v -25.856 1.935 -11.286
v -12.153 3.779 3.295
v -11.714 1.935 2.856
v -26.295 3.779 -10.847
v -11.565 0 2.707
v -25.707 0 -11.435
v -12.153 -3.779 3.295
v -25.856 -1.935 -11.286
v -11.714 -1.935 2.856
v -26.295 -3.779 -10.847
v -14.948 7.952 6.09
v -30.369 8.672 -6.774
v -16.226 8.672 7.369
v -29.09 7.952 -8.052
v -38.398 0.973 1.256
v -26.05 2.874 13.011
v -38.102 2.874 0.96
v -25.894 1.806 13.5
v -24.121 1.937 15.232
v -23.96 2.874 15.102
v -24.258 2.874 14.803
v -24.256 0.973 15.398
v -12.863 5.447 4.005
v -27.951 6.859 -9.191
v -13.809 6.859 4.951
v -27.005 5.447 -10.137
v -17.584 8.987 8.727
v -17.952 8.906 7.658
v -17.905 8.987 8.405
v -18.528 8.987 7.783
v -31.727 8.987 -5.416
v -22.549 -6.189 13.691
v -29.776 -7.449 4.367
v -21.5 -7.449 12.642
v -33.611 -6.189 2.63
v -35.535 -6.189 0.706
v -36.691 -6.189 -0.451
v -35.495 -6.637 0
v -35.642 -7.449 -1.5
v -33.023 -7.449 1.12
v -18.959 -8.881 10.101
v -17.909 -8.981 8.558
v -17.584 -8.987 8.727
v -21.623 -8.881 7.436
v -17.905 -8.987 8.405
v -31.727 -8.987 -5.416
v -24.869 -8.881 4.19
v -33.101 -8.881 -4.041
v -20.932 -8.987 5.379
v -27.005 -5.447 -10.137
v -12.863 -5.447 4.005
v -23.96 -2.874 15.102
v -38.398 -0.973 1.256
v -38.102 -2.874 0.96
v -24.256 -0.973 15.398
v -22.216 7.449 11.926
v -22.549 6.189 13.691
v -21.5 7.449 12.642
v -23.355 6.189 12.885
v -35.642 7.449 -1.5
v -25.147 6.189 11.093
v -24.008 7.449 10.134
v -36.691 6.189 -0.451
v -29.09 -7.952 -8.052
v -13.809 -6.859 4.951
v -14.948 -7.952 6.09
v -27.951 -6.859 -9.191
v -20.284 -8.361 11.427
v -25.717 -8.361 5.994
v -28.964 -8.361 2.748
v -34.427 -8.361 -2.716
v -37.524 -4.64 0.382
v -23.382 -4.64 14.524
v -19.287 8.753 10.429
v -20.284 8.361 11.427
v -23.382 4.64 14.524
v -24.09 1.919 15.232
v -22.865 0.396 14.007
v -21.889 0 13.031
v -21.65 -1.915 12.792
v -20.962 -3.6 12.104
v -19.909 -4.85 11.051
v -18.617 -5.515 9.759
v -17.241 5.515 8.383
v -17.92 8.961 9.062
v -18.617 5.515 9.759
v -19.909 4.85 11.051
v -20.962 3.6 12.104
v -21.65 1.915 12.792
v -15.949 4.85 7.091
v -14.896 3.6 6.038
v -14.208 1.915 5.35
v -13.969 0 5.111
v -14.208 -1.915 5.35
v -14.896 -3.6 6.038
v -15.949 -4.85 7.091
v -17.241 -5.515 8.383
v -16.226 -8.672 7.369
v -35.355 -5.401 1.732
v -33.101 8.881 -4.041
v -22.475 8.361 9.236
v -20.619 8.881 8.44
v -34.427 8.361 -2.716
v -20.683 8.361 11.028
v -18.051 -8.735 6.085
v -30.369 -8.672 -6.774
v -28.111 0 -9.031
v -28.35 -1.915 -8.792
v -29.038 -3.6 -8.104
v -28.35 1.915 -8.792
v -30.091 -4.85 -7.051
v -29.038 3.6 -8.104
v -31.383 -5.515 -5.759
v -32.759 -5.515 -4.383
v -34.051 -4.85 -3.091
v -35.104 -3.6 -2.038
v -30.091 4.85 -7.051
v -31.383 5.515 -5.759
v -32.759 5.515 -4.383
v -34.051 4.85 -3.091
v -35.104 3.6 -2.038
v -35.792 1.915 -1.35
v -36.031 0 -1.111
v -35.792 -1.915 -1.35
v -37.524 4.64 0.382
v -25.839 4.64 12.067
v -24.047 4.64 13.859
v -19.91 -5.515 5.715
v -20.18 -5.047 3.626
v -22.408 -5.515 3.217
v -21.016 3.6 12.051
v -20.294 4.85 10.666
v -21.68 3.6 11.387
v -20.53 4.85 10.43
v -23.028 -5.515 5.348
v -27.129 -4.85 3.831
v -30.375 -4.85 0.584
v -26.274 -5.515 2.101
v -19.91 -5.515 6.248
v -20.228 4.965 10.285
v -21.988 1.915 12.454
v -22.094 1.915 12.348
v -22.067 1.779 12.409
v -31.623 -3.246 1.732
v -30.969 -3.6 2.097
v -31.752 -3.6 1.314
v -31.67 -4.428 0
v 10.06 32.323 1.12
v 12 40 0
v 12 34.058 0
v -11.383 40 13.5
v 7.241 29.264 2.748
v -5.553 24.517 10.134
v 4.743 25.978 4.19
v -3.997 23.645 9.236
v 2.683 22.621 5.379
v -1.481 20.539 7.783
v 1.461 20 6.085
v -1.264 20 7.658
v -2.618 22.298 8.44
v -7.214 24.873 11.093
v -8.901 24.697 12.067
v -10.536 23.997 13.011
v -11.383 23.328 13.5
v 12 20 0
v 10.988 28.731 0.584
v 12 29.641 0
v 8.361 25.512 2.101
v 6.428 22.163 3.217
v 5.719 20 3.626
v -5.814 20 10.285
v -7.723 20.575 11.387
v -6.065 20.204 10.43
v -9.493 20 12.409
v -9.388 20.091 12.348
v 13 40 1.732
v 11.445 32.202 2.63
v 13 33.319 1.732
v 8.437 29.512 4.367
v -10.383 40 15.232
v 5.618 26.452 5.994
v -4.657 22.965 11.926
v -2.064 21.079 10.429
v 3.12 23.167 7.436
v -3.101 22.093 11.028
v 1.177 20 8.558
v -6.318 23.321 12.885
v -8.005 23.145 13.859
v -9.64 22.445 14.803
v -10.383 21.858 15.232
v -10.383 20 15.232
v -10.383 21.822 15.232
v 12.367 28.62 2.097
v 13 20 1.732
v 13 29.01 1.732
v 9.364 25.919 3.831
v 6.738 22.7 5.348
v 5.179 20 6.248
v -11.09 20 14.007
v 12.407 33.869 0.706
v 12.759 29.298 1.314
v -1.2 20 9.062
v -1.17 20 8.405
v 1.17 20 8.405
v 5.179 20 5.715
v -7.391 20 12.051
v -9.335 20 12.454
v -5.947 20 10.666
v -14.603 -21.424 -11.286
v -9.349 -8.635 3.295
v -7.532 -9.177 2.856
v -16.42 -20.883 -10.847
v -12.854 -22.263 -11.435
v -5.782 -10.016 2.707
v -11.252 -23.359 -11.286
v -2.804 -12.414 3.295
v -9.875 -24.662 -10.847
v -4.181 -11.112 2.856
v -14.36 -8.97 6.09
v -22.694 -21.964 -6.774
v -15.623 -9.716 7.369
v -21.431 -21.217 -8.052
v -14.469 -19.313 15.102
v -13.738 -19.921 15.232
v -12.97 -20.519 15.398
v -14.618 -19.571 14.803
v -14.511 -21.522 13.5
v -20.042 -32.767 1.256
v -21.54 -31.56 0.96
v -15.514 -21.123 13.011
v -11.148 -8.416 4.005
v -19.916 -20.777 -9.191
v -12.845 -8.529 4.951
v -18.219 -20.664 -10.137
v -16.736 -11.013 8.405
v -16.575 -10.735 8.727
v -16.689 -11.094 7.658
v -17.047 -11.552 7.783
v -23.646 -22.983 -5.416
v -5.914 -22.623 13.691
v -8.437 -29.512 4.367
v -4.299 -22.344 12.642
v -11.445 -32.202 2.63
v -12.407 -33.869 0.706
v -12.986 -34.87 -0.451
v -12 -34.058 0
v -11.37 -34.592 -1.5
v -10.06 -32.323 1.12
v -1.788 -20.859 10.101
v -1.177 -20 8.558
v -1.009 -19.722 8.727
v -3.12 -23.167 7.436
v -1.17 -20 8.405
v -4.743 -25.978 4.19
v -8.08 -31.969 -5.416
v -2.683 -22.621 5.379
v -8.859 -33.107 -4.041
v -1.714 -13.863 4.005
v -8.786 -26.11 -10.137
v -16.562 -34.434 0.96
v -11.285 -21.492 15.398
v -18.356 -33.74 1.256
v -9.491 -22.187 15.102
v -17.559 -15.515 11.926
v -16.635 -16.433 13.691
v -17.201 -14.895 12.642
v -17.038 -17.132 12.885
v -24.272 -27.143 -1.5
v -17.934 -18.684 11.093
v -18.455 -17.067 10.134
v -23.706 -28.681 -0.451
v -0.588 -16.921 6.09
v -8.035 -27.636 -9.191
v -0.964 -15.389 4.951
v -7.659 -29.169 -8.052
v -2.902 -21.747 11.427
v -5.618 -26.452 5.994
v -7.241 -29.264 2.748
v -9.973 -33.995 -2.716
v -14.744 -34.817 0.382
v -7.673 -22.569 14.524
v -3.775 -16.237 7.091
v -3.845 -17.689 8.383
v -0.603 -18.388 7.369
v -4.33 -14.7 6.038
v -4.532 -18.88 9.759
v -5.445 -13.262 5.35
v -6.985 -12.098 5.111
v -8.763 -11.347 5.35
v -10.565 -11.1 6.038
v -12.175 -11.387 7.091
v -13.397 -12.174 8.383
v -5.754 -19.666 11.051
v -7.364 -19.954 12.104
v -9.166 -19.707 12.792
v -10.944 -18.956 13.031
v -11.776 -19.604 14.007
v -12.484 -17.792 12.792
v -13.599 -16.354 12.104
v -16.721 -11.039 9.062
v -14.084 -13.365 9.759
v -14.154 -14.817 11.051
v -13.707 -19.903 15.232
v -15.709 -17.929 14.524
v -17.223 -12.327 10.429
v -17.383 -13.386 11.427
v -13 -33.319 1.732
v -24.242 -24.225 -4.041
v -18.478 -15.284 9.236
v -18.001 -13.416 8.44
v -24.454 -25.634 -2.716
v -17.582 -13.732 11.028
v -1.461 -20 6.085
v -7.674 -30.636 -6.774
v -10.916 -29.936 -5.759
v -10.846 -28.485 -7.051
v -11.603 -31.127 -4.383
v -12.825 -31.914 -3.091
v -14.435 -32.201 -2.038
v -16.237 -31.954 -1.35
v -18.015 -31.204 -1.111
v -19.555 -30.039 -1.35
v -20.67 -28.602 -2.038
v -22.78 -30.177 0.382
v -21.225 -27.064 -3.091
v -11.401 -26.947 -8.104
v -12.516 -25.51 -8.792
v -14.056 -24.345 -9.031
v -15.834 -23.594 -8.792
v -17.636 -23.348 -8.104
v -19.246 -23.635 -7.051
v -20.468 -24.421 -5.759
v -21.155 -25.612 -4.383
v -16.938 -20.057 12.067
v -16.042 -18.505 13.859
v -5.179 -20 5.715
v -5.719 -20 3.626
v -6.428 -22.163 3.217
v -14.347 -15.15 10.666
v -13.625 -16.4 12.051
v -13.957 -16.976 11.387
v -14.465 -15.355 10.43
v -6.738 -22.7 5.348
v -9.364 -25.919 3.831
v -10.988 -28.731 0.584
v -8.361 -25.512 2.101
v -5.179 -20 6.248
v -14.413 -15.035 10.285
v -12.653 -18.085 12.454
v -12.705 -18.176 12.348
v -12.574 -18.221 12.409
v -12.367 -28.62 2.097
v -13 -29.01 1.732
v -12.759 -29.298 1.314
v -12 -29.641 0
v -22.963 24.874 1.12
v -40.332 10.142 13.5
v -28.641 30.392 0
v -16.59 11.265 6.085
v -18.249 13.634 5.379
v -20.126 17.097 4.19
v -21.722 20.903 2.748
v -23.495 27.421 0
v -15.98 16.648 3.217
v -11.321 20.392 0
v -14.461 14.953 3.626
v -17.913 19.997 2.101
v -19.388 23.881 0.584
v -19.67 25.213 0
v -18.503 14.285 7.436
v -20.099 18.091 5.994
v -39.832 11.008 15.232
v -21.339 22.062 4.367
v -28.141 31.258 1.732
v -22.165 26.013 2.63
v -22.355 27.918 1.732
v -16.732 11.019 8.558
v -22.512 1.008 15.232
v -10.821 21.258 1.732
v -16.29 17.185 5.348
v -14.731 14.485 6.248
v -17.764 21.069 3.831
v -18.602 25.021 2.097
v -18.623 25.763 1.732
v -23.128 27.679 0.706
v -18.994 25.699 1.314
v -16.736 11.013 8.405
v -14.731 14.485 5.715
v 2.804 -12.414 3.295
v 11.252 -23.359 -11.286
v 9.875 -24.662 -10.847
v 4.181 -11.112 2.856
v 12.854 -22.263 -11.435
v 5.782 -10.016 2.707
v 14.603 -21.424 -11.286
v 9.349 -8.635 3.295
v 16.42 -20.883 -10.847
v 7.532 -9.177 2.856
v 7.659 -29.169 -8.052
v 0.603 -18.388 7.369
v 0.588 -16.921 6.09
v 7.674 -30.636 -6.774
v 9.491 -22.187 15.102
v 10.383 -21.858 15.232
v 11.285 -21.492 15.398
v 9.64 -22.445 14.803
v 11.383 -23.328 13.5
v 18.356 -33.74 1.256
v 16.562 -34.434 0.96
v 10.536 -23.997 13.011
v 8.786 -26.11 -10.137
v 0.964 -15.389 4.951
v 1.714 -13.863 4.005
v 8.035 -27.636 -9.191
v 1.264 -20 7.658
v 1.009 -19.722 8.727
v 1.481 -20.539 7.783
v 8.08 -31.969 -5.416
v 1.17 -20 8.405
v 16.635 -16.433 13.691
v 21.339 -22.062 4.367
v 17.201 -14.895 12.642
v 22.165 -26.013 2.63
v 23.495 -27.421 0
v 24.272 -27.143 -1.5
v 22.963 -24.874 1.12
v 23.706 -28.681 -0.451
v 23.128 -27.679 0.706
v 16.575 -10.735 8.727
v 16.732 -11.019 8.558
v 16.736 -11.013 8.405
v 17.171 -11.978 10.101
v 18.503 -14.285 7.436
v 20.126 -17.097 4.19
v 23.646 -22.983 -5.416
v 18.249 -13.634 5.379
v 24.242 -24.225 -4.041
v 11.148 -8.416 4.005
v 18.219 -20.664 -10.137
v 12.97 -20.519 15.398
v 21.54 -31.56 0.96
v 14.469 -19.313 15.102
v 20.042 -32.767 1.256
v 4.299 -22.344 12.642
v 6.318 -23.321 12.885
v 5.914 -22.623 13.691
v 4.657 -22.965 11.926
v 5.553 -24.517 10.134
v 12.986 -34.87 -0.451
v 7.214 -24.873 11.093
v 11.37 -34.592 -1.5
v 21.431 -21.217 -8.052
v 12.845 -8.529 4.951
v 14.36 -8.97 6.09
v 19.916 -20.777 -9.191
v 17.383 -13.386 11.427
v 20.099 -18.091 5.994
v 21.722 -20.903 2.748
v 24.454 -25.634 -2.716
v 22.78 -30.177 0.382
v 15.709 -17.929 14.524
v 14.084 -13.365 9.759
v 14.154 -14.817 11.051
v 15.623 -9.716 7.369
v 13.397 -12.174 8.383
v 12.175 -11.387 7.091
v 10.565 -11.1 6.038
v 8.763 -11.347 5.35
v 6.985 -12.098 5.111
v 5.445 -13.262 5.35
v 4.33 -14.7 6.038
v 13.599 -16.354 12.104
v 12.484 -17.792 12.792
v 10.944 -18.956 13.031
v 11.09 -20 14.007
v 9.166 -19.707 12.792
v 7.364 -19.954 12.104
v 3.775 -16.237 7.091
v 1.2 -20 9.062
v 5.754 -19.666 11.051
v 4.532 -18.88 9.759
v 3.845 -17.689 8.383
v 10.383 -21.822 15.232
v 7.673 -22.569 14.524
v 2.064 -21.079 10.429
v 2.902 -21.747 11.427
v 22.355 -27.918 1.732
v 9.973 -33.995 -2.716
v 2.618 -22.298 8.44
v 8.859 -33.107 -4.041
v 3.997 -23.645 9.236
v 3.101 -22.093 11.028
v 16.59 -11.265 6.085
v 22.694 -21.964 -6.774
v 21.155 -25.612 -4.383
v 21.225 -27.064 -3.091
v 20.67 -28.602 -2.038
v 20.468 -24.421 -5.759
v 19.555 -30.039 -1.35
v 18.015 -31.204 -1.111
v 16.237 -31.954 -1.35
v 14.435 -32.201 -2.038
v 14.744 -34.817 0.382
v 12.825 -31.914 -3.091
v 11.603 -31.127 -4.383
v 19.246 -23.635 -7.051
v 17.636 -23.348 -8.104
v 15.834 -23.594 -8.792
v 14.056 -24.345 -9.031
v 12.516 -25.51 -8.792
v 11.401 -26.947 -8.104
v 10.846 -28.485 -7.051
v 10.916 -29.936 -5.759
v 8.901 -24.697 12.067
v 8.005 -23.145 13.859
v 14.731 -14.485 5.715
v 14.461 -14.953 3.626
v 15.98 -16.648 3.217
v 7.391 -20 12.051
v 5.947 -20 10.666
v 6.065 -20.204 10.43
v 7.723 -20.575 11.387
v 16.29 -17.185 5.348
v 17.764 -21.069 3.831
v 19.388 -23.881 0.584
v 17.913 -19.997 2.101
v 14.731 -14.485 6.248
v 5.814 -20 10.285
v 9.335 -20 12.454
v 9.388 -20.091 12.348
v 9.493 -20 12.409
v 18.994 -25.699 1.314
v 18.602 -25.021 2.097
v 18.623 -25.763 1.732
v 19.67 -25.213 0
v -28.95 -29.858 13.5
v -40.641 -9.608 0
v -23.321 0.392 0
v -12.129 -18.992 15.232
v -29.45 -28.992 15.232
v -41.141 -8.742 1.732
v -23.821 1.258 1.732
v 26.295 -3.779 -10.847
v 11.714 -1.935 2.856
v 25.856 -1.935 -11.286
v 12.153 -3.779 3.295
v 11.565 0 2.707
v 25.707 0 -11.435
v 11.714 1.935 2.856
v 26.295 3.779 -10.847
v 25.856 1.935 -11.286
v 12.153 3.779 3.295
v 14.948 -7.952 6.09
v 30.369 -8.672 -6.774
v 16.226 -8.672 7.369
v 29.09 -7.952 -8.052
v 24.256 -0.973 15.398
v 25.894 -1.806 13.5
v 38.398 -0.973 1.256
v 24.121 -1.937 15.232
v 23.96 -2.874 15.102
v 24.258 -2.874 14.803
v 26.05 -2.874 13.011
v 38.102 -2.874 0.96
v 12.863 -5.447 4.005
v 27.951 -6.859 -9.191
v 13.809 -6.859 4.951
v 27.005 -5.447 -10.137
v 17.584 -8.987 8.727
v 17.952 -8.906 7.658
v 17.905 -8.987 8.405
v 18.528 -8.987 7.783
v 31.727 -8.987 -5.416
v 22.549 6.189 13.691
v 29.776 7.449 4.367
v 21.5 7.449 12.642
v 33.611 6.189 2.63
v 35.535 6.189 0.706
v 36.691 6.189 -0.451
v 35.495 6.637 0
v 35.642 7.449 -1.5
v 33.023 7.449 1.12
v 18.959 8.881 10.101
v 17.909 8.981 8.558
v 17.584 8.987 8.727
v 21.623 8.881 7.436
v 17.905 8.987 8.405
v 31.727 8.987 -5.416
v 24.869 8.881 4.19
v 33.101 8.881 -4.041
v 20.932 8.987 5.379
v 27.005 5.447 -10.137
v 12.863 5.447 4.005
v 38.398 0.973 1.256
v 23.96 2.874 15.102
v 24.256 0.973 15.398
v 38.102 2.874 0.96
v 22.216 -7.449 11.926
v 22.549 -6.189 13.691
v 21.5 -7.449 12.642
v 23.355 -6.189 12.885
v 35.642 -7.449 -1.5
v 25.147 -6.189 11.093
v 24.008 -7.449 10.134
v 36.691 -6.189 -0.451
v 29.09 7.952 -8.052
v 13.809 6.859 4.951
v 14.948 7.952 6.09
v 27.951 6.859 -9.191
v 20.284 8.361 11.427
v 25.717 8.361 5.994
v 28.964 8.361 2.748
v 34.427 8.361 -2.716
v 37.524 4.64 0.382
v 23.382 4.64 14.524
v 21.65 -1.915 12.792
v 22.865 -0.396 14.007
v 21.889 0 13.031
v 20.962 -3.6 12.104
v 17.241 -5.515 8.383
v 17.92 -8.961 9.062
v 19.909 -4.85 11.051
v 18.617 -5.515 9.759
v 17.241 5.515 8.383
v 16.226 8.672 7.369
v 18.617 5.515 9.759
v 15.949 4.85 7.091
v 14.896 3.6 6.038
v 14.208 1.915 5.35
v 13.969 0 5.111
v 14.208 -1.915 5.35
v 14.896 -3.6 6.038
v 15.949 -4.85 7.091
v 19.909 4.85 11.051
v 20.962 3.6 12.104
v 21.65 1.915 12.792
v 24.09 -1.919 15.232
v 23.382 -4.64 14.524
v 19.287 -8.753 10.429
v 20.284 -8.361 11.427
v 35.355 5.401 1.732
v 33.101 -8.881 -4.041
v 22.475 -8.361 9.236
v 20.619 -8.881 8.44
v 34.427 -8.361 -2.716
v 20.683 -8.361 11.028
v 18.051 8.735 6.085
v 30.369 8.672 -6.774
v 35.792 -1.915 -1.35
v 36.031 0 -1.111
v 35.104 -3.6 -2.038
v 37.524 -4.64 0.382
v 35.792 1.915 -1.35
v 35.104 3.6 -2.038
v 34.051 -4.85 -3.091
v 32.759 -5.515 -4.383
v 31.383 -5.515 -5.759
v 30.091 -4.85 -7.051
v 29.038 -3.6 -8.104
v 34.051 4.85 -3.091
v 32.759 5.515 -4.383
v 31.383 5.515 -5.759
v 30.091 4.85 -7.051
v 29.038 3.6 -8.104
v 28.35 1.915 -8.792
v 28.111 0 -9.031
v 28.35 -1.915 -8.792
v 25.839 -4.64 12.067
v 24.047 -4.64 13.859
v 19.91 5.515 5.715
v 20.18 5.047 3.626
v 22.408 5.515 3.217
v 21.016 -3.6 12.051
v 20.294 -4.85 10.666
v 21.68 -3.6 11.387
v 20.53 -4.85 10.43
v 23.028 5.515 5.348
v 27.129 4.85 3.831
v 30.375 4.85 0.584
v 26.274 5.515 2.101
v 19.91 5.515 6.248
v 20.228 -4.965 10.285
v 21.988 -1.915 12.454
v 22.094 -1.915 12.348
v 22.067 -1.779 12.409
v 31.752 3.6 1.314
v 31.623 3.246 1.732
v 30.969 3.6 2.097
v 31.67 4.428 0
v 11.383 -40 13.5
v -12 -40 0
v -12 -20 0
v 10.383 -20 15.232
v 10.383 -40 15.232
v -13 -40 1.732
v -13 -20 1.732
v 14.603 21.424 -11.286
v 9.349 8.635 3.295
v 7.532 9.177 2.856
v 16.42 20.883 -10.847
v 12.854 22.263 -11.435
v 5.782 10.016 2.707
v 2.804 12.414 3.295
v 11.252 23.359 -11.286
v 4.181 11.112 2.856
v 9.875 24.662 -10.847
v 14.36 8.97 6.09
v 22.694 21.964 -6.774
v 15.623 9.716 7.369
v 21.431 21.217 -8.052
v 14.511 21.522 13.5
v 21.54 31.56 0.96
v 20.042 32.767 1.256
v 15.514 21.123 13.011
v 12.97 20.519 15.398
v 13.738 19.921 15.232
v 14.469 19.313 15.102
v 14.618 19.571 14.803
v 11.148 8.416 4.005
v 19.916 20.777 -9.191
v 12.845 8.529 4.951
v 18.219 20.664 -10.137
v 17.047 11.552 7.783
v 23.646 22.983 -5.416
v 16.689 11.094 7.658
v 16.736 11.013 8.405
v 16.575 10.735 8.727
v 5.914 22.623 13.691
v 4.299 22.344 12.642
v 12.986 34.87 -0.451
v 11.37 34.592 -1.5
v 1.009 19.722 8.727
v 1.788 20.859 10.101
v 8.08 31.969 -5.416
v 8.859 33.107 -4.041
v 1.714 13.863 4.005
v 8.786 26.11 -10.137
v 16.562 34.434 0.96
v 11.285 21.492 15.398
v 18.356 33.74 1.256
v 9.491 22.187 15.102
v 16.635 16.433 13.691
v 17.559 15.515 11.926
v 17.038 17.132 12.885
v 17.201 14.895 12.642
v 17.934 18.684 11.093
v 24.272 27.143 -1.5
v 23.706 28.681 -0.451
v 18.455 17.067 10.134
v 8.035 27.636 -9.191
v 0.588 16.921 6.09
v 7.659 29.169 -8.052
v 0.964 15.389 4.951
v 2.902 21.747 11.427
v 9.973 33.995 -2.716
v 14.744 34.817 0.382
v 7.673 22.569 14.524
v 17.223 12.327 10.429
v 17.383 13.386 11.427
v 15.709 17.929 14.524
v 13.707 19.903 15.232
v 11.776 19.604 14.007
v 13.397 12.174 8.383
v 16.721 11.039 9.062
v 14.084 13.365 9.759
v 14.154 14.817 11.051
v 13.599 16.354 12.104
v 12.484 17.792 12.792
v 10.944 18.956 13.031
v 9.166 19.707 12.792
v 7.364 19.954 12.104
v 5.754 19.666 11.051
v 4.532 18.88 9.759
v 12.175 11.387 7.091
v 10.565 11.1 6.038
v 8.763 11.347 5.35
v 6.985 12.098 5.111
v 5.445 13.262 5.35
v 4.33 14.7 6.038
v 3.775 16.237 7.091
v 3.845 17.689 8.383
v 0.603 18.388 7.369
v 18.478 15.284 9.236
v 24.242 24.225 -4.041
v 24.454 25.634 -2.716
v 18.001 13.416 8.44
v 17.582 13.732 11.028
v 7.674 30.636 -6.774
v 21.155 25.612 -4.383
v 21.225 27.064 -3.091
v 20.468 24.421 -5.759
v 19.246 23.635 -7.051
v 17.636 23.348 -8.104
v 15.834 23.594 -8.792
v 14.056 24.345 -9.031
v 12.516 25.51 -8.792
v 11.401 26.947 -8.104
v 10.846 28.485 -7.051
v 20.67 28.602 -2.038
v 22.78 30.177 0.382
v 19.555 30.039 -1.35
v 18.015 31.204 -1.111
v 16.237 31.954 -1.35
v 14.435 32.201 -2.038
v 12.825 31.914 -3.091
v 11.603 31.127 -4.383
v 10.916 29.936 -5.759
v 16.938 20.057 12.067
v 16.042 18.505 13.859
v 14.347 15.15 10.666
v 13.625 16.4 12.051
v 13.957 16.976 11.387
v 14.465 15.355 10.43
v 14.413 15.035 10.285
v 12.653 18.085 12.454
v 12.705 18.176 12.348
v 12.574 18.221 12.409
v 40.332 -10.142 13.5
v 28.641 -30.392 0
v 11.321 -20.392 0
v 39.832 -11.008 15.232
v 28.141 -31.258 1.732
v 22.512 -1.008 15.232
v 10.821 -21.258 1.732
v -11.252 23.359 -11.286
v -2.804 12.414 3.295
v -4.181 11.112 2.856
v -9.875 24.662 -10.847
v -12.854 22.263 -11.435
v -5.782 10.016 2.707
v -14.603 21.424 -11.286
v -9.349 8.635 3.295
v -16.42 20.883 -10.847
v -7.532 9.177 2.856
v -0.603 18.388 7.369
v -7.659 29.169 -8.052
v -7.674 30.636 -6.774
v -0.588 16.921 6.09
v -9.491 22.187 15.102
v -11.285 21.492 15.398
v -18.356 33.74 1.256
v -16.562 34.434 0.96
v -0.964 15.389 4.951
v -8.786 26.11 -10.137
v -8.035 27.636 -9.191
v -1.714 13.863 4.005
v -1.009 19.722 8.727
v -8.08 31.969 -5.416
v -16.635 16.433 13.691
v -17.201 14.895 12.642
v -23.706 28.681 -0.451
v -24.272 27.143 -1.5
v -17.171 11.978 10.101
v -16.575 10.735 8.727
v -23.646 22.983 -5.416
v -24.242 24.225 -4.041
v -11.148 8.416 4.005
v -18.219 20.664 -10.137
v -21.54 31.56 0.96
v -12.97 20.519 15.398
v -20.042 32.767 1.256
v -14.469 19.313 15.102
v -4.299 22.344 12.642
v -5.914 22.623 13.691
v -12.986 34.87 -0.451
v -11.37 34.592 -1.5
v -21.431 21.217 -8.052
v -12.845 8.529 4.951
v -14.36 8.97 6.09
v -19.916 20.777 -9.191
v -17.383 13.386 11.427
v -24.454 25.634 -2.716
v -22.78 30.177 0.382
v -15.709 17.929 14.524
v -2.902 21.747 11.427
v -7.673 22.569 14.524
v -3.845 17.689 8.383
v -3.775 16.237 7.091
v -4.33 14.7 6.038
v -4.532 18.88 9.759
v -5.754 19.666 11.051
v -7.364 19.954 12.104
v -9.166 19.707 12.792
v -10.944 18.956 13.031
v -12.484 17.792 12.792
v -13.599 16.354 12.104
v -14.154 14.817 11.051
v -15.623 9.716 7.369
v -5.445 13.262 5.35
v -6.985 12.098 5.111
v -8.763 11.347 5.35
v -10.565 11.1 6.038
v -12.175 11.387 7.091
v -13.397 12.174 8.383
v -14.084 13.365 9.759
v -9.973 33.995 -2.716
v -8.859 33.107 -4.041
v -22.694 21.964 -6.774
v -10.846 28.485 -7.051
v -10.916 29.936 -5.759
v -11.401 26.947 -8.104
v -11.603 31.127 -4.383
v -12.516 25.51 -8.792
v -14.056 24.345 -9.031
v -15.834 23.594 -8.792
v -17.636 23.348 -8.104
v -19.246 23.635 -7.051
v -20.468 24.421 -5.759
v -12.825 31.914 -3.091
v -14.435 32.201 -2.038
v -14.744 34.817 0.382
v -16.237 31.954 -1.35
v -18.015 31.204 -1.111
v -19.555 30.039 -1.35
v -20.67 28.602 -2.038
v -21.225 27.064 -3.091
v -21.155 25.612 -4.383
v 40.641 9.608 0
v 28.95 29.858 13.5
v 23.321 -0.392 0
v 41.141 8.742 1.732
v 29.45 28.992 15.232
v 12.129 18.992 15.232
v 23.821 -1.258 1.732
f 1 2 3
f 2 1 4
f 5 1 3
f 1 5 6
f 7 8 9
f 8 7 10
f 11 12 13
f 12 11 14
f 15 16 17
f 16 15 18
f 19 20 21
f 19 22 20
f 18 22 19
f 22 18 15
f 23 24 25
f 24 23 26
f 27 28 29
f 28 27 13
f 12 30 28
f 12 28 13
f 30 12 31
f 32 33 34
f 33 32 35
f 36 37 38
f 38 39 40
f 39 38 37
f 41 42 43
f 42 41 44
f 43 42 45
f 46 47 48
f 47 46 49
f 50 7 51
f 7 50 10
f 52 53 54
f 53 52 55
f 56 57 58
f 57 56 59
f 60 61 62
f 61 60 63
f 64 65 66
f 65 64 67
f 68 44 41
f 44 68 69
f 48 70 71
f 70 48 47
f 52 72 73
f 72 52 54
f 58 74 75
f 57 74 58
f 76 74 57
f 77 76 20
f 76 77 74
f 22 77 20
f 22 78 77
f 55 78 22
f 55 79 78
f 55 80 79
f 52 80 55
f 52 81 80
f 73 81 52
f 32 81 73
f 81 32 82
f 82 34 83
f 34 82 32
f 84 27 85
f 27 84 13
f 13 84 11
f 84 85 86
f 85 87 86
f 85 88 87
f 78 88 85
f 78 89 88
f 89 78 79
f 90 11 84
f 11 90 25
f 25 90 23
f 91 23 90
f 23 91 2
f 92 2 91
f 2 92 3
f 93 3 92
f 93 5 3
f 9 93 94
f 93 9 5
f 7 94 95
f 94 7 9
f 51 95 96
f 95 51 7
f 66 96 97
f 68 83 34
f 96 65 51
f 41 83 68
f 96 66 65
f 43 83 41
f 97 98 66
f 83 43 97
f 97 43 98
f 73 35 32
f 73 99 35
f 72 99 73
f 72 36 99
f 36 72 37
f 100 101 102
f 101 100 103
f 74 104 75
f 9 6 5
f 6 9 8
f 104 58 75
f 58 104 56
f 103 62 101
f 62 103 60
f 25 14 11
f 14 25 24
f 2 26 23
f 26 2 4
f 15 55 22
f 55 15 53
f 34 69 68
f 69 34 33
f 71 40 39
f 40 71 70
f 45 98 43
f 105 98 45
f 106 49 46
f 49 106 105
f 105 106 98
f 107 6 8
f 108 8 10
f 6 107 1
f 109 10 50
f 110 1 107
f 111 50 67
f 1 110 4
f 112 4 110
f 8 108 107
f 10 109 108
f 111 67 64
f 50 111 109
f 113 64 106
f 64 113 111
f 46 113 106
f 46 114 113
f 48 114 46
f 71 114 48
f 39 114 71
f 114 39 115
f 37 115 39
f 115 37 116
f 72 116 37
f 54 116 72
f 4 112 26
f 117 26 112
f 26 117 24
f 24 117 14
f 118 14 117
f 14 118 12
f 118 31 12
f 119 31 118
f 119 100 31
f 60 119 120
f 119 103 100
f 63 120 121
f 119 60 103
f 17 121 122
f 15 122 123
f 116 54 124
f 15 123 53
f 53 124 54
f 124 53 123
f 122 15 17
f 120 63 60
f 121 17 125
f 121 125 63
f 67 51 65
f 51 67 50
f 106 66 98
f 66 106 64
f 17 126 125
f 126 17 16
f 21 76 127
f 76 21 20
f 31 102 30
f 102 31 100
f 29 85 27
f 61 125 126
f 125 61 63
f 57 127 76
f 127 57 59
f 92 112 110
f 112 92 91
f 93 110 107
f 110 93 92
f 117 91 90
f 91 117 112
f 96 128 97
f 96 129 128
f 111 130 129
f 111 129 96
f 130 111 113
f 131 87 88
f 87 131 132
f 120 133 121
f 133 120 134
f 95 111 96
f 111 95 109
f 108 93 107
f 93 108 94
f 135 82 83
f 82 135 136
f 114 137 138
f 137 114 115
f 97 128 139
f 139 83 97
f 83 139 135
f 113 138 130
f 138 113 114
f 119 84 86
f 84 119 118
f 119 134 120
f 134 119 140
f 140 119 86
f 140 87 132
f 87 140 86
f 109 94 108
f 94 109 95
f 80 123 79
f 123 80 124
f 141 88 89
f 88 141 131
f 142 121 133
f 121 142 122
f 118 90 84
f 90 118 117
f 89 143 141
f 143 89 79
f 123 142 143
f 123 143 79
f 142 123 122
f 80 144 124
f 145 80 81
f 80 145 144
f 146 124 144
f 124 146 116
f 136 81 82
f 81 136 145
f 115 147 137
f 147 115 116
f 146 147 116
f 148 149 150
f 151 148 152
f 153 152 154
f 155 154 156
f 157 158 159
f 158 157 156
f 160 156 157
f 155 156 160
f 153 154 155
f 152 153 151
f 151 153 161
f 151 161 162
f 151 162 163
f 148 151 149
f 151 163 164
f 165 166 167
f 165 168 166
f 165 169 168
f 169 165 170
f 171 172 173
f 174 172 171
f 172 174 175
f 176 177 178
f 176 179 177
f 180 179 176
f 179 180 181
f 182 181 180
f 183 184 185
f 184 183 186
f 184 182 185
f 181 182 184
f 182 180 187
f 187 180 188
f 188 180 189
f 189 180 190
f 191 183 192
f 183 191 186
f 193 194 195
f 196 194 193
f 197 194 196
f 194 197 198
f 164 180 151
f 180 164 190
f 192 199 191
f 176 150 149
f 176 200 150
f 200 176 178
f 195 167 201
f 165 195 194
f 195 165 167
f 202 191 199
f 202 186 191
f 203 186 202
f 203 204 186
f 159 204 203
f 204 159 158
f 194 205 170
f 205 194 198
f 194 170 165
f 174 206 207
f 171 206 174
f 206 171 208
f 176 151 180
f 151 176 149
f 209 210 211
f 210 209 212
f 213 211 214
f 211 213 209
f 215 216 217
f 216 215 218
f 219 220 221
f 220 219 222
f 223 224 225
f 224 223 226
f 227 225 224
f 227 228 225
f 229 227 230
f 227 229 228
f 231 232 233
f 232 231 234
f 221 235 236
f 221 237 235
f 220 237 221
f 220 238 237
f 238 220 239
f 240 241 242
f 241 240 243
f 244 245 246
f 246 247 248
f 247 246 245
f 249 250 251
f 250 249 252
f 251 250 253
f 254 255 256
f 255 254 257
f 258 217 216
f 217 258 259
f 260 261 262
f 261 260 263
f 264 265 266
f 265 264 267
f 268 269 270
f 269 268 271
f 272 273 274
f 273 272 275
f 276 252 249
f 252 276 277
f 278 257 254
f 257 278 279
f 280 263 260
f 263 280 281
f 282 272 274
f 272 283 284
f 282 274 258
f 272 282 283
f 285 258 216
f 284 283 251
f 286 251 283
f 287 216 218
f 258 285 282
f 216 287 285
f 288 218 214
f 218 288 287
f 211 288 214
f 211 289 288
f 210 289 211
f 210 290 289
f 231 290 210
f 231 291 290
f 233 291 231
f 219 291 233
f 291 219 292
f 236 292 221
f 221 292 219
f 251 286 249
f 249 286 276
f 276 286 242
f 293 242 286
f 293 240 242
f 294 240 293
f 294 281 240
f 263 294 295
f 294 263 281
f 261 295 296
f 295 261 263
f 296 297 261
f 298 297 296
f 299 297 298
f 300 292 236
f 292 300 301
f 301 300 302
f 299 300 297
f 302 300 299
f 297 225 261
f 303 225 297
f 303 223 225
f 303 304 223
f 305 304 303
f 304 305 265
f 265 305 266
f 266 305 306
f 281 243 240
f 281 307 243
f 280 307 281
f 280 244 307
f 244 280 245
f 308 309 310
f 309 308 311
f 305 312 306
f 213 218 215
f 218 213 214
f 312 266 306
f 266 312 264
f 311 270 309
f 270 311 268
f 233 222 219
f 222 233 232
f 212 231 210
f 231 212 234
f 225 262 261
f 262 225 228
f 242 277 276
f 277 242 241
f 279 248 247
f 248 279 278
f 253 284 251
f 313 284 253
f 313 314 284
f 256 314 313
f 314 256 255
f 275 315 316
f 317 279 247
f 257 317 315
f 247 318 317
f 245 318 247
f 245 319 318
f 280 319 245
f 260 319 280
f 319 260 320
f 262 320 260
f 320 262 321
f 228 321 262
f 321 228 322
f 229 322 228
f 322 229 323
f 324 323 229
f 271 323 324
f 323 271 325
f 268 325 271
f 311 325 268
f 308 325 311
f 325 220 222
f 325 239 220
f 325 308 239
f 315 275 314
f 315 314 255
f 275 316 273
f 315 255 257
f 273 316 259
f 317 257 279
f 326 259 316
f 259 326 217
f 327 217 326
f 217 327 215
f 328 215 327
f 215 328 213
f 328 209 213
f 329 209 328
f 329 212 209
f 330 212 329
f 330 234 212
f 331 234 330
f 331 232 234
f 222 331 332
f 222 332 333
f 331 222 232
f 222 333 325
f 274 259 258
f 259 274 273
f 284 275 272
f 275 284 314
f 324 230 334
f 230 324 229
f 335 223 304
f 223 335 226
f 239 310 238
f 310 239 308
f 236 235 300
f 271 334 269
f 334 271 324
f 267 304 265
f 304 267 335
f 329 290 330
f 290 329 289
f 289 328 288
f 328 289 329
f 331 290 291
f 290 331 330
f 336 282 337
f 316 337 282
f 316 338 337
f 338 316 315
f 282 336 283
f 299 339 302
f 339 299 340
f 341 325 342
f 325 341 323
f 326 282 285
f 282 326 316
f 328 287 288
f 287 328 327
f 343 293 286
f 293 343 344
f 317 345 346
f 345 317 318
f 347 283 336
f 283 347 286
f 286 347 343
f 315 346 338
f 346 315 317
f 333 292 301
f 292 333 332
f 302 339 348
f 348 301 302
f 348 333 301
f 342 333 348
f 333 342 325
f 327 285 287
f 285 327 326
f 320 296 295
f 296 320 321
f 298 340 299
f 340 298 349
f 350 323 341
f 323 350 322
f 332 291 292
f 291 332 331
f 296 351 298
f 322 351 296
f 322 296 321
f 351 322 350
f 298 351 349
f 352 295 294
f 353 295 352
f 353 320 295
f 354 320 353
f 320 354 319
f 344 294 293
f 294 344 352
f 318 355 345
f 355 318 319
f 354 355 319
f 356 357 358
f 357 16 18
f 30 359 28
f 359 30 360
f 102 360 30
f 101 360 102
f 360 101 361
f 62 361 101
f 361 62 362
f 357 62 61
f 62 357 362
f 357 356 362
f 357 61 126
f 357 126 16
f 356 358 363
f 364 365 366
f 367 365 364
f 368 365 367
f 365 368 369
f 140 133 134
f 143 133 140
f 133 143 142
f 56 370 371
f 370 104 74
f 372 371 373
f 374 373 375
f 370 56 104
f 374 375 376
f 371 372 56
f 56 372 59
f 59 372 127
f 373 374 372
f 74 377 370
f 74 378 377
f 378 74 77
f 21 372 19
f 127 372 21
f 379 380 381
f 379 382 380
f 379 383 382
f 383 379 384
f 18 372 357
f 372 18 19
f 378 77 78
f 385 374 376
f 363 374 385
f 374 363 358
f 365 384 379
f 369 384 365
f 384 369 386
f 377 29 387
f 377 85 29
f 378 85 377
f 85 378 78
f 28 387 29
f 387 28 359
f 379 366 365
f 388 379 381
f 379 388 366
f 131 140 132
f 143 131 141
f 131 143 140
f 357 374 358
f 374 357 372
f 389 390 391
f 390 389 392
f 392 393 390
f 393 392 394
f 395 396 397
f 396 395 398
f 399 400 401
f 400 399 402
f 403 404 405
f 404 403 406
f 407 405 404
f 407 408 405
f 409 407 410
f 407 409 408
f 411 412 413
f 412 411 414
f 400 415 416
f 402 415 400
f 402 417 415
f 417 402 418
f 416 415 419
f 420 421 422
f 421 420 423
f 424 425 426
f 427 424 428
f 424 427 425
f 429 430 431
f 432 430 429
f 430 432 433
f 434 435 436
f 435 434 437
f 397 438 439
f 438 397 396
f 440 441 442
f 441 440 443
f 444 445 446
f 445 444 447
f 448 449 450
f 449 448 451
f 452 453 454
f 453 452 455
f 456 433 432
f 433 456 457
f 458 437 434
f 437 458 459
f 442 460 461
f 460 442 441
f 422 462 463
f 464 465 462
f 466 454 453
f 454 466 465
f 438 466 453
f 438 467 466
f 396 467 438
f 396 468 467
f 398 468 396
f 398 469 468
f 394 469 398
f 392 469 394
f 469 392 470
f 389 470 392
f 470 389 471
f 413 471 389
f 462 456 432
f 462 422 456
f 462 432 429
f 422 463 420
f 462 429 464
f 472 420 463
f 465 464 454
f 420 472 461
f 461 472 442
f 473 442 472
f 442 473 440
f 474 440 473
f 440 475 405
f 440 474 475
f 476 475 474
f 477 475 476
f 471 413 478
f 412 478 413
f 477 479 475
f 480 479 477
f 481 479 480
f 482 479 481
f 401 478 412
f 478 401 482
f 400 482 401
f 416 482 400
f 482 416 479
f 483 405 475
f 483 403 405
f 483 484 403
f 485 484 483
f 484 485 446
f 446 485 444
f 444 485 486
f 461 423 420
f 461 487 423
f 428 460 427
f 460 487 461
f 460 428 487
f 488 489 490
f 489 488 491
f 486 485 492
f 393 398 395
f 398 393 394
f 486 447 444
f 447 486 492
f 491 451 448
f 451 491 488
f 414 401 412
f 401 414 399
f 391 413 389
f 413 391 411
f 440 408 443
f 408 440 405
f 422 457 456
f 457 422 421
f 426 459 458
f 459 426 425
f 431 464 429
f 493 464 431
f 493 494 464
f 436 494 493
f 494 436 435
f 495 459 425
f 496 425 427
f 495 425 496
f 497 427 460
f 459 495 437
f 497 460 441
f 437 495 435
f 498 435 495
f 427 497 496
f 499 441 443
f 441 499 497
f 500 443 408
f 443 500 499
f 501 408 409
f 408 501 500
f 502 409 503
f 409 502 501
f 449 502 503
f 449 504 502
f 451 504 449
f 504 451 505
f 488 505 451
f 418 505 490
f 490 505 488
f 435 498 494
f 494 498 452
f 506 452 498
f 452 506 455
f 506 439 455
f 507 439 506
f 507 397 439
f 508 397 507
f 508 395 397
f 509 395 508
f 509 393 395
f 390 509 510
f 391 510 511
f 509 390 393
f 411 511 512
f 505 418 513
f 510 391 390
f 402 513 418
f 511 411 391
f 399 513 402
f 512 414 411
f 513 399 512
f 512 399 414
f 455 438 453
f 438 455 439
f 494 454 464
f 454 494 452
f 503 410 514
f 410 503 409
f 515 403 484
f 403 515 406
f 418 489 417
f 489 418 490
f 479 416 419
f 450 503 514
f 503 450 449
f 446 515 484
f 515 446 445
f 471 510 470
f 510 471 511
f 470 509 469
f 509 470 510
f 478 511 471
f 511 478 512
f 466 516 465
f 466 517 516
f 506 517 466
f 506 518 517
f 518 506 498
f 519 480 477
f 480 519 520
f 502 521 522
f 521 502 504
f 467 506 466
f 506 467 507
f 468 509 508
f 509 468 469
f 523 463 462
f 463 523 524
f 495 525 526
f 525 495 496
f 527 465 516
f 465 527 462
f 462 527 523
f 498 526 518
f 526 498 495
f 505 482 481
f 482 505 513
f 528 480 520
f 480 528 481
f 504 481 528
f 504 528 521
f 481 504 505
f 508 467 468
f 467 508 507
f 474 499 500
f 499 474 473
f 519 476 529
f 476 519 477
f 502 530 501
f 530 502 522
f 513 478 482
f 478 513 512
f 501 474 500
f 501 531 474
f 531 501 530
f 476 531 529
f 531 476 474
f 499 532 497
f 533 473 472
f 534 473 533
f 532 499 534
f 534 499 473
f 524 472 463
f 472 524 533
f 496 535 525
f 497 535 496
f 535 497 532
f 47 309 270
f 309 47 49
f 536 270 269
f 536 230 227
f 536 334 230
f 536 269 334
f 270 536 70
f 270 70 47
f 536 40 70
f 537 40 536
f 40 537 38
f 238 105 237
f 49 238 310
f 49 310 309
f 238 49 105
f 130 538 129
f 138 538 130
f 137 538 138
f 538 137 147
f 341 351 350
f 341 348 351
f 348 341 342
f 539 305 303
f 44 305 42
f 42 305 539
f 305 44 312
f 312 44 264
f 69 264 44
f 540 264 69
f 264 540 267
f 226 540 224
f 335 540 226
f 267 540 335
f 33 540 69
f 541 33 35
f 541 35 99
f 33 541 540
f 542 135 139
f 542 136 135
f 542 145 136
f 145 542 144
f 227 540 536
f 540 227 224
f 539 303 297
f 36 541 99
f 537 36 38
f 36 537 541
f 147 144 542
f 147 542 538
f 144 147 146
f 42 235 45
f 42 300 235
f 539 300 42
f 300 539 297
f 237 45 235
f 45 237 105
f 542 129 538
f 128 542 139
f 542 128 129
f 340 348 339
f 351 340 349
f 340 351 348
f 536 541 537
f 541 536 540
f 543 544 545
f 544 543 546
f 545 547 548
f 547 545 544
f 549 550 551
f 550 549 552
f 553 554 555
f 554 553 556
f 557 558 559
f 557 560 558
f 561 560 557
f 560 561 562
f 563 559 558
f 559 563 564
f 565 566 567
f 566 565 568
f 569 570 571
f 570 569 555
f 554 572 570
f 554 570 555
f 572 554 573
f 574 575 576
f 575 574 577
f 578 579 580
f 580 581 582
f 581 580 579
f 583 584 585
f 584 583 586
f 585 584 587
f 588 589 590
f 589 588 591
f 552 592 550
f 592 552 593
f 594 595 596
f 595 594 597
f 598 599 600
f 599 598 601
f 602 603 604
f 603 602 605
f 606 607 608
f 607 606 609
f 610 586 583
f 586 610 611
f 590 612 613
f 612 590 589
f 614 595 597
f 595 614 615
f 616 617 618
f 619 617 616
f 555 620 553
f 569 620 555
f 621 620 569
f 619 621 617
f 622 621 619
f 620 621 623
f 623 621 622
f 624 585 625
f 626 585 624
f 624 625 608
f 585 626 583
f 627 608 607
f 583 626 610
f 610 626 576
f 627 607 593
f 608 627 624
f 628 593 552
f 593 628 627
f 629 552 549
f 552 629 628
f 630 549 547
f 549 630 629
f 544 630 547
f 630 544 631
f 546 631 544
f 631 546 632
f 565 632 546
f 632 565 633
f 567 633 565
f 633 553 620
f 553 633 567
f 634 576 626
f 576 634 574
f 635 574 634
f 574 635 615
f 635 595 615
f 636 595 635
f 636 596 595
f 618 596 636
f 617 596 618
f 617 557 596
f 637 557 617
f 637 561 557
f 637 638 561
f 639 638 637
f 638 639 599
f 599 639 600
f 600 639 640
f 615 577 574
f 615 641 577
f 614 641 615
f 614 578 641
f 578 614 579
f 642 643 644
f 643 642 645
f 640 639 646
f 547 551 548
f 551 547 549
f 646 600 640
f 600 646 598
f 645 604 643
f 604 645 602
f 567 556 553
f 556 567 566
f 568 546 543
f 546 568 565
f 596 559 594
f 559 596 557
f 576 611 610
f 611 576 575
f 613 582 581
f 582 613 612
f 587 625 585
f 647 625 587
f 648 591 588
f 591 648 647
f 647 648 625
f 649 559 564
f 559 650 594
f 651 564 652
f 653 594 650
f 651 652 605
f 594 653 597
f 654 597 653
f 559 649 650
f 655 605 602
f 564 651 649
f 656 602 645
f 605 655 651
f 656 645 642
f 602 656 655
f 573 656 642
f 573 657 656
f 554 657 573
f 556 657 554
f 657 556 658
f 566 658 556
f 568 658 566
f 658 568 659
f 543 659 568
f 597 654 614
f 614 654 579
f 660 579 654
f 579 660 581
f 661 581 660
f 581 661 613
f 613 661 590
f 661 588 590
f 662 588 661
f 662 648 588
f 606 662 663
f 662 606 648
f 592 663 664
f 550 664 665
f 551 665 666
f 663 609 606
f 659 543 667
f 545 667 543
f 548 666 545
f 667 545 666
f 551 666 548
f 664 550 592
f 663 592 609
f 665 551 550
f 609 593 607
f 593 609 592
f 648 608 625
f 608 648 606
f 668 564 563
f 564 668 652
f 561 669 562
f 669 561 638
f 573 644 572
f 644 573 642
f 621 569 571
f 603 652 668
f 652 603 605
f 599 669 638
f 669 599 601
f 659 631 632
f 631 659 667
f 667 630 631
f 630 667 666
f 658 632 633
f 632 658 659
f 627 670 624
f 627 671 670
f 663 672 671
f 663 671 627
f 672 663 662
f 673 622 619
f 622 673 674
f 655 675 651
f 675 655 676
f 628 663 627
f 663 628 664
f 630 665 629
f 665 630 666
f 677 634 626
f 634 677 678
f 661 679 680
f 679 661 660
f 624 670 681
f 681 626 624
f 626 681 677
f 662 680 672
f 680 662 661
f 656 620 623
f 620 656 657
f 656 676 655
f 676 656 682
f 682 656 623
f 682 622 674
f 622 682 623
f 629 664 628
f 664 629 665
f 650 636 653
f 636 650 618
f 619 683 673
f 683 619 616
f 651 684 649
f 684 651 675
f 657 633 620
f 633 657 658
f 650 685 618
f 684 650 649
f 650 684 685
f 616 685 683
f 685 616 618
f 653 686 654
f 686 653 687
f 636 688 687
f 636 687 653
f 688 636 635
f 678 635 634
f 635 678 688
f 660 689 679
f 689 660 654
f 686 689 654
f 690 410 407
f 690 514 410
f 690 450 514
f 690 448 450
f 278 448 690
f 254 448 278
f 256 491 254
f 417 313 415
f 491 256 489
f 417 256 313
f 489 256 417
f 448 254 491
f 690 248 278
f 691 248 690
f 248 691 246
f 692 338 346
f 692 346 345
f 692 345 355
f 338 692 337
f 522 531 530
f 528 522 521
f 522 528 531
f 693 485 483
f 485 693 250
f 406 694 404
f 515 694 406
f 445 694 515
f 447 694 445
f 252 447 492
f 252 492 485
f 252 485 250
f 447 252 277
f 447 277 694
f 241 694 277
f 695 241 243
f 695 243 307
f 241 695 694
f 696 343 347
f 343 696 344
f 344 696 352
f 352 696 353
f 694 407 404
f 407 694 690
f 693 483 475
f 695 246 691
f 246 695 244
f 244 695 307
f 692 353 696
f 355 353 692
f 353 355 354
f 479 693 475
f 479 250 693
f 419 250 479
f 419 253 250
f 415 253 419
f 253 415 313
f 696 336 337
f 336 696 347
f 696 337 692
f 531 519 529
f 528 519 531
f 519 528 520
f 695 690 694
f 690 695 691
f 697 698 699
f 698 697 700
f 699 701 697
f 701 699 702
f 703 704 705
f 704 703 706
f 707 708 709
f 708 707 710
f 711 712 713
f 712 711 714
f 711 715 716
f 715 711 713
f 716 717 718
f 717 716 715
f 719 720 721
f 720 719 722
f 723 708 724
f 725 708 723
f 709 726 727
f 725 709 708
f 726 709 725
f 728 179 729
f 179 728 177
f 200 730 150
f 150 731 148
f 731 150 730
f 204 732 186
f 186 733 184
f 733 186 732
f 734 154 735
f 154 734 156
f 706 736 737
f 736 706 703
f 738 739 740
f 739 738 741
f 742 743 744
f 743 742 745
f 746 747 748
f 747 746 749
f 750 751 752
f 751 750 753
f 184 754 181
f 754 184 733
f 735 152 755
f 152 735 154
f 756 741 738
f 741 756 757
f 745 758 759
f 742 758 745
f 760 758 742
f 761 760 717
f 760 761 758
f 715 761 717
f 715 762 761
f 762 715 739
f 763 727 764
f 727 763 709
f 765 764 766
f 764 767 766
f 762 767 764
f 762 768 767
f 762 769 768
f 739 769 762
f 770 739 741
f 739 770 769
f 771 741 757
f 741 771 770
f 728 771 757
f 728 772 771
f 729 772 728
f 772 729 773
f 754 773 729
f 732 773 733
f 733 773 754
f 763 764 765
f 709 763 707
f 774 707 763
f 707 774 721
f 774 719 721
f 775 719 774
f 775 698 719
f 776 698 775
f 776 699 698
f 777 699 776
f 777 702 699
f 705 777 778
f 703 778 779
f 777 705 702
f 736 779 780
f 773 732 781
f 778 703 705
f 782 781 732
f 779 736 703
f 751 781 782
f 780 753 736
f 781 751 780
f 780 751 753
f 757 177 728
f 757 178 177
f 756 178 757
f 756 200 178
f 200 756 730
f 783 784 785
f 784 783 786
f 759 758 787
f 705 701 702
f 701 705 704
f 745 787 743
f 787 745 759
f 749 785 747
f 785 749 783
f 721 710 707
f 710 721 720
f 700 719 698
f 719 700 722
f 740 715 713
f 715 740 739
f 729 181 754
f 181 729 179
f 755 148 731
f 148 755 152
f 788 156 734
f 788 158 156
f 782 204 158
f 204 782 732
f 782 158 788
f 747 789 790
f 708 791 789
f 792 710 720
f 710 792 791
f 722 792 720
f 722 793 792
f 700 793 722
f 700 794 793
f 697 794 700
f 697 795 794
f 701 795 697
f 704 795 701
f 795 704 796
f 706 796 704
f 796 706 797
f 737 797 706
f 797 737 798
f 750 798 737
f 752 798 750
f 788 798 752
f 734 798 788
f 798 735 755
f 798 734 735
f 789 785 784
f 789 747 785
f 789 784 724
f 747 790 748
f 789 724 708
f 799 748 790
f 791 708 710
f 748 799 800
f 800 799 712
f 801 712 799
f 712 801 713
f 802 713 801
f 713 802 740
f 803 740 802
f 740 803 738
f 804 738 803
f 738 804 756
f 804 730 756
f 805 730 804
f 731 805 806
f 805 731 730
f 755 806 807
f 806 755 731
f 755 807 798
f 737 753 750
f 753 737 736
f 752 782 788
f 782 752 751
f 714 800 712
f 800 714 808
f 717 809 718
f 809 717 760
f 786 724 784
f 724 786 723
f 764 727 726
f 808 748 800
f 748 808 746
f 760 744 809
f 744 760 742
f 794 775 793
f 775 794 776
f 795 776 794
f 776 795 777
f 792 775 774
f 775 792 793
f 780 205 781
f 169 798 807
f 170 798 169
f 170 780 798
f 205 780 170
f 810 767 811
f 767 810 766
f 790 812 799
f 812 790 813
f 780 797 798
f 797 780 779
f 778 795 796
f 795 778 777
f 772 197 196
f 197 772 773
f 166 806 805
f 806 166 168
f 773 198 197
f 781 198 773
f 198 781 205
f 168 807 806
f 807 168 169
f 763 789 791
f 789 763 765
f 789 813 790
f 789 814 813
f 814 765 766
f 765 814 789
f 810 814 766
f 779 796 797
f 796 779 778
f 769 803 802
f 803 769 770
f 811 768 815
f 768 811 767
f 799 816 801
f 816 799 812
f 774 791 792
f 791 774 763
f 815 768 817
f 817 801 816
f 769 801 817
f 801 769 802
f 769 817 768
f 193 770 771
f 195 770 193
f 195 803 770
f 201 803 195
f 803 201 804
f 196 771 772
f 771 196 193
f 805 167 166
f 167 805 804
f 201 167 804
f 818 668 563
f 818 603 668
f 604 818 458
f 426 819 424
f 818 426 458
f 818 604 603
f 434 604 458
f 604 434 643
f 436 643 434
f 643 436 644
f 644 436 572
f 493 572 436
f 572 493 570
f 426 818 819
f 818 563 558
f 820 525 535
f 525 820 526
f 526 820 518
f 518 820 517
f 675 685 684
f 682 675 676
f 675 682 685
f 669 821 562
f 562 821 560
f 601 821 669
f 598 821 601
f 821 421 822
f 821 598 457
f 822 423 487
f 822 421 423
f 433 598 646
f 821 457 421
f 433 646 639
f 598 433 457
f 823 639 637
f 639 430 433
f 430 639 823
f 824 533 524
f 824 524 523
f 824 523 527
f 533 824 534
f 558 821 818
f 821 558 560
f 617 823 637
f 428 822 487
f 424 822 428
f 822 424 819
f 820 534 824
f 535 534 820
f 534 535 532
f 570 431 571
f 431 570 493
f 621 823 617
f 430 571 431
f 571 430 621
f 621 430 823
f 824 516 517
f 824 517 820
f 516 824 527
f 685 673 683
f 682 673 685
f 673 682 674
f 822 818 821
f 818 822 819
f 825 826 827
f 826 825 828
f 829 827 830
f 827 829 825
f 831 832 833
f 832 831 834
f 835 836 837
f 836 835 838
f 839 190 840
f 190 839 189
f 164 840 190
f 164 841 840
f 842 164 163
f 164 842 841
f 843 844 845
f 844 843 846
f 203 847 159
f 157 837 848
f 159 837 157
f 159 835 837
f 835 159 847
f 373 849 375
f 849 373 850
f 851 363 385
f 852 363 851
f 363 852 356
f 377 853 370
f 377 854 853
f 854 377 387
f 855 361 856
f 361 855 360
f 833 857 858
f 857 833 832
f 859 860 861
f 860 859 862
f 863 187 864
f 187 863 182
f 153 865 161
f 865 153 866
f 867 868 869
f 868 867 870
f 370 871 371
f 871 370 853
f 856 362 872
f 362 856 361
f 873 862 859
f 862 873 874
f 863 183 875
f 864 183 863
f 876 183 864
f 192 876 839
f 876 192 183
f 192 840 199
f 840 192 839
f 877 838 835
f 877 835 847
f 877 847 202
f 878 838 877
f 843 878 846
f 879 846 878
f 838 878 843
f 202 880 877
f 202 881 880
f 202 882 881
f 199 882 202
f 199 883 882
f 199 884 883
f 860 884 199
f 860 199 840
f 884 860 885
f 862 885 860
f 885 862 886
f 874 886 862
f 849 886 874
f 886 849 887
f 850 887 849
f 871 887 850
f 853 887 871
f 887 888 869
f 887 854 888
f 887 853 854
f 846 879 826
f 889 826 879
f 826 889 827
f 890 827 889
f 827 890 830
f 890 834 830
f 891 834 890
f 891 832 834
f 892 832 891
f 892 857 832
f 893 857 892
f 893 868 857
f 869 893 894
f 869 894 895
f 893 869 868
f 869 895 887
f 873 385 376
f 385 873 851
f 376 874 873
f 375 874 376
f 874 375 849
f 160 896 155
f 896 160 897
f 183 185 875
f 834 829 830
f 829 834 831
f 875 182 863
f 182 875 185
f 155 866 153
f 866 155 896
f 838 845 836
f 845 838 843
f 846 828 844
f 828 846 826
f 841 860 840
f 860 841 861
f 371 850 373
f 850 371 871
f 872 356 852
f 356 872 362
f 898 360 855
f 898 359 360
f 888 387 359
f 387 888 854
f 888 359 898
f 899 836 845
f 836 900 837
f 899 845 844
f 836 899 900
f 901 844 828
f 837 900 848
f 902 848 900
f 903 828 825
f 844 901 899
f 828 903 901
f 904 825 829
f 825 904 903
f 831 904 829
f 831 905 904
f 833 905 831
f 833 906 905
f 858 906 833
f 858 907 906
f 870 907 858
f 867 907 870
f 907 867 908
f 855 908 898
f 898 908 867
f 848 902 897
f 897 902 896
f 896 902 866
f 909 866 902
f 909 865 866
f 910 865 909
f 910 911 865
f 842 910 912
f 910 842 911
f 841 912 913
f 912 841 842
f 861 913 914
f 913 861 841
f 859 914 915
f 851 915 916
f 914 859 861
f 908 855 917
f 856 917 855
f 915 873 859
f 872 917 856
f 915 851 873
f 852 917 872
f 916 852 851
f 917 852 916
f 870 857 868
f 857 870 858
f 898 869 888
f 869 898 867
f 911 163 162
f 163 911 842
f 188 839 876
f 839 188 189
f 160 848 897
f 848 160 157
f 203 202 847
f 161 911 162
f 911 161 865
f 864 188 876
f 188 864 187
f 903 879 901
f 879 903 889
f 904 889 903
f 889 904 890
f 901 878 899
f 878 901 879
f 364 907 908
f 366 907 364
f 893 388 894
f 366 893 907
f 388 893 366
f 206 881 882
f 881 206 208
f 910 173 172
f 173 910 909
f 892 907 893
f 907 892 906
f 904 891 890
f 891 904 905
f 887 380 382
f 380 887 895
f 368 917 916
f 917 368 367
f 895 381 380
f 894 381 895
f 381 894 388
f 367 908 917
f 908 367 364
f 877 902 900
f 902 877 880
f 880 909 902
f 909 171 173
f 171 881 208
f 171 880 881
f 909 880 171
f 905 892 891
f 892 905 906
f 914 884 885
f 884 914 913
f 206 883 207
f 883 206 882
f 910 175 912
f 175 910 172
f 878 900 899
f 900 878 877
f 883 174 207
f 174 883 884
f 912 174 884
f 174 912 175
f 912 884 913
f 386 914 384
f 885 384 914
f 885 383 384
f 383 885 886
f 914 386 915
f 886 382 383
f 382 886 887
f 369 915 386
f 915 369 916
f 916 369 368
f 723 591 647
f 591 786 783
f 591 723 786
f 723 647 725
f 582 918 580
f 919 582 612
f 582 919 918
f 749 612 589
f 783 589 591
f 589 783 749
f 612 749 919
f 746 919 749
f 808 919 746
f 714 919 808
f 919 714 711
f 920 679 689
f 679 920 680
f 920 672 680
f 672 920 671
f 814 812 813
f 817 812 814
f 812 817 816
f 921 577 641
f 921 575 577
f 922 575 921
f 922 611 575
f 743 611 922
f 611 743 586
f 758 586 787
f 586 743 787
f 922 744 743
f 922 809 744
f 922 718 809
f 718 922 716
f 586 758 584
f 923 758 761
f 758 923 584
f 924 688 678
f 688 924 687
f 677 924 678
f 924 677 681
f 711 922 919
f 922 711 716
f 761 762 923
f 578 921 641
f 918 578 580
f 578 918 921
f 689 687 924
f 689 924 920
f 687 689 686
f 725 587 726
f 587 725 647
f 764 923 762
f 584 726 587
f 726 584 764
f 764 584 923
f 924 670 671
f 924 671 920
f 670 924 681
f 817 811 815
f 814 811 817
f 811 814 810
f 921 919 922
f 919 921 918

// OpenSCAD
module rotor(){
  translate([18,258,0])
  import("V2_Rotor.stl", convexity=3);
  $fn=64;
  for(i=[0:5]){
    rotate(i*60,[0,0,1])
    translate([0,25,0])
    rotate([0,20,30])cube([2,13,17]);
  }
}

/* rotor(); */
module sample(){
  difference(){
    cylinder(h=20, r=9, center=true);
    cylinder(h=30, r=5.6, center=true);
  }
}

for(i=[0:5]){
  rotate(i*60,[0,0,1])
  union(){
  translate([-25,0,2])rotate([0,45,0])sample();
  translate([12,20,0])rotate([0,-60,0])cube([2,20,27]);
  }
}


module fan(){
  import("4-inch-fan.stl");
}

/* scale(0.85)translate([0,0,0])color("DarkSlateGray",0.25)fan(); */

/* translate([0,60,0])
union(){
sample();
translate([12,-5,2])rotate([0,-50,0])cube([2,27,20],center=true);
} */
